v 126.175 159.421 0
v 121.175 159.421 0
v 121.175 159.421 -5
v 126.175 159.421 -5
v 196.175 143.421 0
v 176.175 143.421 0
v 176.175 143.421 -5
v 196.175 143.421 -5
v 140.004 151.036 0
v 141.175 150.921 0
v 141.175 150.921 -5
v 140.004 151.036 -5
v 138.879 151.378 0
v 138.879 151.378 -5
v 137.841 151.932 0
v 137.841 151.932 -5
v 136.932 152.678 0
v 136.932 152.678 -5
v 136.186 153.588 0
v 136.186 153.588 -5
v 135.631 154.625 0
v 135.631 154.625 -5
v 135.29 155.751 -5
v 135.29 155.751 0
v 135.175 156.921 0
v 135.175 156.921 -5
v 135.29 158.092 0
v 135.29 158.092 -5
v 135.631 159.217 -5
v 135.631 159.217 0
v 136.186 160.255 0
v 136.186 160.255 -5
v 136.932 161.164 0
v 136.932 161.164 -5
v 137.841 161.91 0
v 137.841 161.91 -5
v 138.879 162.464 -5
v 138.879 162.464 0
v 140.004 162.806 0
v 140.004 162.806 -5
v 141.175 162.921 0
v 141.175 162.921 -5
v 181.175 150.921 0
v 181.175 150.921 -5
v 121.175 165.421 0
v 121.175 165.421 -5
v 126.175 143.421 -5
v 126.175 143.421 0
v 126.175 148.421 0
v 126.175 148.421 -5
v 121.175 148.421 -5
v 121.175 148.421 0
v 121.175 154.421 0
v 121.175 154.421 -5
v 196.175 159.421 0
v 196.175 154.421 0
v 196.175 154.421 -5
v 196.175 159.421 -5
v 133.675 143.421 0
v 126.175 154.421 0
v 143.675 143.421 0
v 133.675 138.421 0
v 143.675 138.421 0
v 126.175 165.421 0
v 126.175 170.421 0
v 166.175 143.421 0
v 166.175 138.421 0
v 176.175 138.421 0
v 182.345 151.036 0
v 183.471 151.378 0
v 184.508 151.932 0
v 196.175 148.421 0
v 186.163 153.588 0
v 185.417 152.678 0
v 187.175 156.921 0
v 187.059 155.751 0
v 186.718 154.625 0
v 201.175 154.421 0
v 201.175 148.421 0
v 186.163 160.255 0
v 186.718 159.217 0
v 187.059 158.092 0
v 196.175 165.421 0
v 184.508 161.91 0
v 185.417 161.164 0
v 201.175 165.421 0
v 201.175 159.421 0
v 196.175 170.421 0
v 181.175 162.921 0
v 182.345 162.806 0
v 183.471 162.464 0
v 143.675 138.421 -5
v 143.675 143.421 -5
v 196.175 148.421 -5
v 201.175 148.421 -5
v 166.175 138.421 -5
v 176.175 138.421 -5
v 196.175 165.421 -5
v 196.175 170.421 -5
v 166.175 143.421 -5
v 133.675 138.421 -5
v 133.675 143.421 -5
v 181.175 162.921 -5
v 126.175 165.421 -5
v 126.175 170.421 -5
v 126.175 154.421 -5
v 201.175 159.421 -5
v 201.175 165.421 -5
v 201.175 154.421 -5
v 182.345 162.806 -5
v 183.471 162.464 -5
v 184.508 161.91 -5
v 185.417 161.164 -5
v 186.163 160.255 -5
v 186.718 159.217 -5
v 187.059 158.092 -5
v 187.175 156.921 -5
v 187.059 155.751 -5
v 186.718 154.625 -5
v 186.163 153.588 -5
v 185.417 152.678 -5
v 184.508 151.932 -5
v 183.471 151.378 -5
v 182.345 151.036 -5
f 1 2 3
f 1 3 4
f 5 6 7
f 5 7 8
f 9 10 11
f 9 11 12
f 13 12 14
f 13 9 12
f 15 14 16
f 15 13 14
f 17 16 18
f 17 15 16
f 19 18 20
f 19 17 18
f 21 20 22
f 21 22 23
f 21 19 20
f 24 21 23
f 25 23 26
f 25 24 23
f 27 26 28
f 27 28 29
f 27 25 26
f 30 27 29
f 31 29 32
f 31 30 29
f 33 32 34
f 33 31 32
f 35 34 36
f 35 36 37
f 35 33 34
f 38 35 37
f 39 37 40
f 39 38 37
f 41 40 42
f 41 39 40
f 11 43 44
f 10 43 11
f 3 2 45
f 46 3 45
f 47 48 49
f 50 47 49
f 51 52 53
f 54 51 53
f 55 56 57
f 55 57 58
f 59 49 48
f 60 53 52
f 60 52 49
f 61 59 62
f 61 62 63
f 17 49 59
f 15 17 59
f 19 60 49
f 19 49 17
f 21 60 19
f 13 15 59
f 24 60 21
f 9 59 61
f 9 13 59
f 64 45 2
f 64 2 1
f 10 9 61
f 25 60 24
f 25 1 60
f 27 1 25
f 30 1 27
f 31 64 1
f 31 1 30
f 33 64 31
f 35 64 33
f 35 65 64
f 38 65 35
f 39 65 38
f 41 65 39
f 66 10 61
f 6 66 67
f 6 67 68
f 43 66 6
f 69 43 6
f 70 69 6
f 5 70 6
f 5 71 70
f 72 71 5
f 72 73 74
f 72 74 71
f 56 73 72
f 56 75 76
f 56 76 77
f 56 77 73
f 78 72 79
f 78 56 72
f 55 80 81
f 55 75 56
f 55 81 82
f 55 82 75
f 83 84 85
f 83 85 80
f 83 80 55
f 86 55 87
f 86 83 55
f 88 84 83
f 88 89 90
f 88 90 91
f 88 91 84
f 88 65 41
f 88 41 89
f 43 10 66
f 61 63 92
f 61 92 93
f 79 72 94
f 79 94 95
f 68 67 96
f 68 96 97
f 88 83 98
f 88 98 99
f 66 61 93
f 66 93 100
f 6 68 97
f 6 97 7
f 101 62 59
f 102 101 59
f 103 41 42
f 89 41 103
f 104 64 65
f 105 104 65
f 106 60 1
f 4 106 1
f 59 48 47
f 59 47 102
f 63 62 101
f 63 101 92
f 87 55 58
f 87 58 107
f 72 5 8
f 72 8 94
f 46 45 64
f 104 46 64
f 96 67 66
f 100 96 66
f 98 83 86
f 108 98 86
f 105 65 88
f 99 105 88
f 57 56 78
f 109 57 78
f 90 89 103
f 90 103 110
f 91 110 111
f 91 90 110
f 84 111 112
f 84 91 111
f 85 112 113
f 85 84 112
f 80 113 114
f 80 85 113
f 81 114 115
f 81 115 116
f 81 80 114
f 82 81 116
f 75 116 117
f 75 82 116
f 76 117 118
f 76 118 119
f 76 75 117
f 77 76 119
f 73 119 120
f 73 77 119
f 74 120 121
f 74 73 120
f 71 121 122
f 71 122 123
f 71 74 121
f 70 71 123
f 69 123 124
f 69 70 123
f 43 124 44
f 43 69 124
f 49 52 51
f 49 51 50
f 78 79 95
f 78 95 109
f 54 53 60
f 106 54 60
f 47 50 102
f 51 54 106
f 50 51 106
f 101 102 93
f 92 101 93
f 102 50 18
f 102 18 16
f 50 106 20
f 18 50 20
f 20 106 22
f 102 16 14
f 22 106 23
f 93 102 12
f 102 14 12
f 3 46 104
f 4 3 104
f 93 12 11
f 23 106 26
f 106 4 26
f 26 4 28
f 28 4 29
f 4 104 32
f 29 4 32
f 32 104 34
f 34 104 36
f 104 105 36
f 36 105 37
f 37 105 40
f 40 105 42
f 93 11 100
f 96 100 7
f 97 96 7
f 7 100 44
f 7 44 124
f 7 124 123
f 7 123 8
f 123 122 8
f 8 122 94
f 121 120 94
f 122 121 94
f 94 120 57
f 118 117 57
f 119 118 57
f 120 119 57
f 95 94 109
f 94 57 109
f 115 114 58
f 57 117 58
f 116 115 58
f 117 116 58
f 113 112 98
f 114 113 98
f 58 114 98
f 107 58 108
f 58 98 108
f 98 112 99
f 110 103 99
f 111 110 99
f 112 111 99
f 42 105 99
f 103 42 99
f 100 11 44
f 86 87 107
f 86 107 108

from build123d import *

# Parameters (mm, degrees)
ESQUISSE1_W        = 80
ESQUISSE1_H        = 27
BOSS_EXTRU_1_DEPTH = 5
ESQUISSE2_W        = 5
ESQUISSE2_H        = 5
CR_NEAUX_DEPTH     = 5
ESQUISSE3_W        = 10
ESQUISSE3_H        = 5
BOSS_EXTRU_2_DEPTH = 5


with BuildPart() as part:
    # Esquisse1 → Boss.-Extru.1 (new body)
    with BuildSketch(Plane.XY):
        with Locations((161.17461402, 156.921111622)):
            Rectangle(ESQUISSE1_W, ESQUISSE1_H)
    extrude(amount=-BOSS_EXTRU_1_DEPTH)

    # Esquisse2 → Créneaux - (cut)
    with BuildSketch(Plane.XY):
        with Locations((123.67461402, 167.921111622)):
            Rectangle(ESQUISSE2_W, ESQUISSE2_H)
        with Locations((123.67461402, 156.921111622)):
            Rectangle(ESQUISSE2_W, ESQUISSE2_H)
        with Locations((123.67461402, 145.921111622)):
            Rectangle(ESQUISSE2_W, ESQUISSE2_H)
        with Locations((198.67461402, 145.921111622)):
            Rectangle(ESQUISSE2_W, ESQUISSE2_H)
        with Locations((198.67461402, 156.921111622)):
            Rectangle(ESQUISSE2_W, ESQUISSE2_H)
        with Locations((198.67461402, 167.921111622)):
            Rectangle(ESQUISSE2_W, ESQUISSE2_H)
        with BuildLine():
            Line((141.17461402, 162.921111622), (181.17461402, 162.921111622))
            ThreePointArc((181.17461402, 162.921111622), (187.17461402, 156.921111622), (181.17461402, 150.921111622))
            Line((181.17461402, 150.921111622), (141.17461402, 150.921111622))
            ThreePointArc((141.17461402, 150.921111622), (135.17461402, 156.921111622), (141.17461402, 162.921111622))
        make_face()
    extrude(amount=-CR_NEAUX_DEPTH, mode=Mode.SUBTRACT)

    # Esquisse3 → Boss.-Extru.2 (add)
    with BuildSketch(Plane.XY):
        with Locations((138.67461402, 140.921111622)):
            Rectangle(ESQUISSE3_W, ESQUISSE3_H)
        with Locations((171.17461402, 140.921111622)):
            Rectangle(ESQUISSE3_W, ESQUISSE3_H)
    extrude(amount=-BOSS_EXTRU_2_DEPTH)


solid = part.part
